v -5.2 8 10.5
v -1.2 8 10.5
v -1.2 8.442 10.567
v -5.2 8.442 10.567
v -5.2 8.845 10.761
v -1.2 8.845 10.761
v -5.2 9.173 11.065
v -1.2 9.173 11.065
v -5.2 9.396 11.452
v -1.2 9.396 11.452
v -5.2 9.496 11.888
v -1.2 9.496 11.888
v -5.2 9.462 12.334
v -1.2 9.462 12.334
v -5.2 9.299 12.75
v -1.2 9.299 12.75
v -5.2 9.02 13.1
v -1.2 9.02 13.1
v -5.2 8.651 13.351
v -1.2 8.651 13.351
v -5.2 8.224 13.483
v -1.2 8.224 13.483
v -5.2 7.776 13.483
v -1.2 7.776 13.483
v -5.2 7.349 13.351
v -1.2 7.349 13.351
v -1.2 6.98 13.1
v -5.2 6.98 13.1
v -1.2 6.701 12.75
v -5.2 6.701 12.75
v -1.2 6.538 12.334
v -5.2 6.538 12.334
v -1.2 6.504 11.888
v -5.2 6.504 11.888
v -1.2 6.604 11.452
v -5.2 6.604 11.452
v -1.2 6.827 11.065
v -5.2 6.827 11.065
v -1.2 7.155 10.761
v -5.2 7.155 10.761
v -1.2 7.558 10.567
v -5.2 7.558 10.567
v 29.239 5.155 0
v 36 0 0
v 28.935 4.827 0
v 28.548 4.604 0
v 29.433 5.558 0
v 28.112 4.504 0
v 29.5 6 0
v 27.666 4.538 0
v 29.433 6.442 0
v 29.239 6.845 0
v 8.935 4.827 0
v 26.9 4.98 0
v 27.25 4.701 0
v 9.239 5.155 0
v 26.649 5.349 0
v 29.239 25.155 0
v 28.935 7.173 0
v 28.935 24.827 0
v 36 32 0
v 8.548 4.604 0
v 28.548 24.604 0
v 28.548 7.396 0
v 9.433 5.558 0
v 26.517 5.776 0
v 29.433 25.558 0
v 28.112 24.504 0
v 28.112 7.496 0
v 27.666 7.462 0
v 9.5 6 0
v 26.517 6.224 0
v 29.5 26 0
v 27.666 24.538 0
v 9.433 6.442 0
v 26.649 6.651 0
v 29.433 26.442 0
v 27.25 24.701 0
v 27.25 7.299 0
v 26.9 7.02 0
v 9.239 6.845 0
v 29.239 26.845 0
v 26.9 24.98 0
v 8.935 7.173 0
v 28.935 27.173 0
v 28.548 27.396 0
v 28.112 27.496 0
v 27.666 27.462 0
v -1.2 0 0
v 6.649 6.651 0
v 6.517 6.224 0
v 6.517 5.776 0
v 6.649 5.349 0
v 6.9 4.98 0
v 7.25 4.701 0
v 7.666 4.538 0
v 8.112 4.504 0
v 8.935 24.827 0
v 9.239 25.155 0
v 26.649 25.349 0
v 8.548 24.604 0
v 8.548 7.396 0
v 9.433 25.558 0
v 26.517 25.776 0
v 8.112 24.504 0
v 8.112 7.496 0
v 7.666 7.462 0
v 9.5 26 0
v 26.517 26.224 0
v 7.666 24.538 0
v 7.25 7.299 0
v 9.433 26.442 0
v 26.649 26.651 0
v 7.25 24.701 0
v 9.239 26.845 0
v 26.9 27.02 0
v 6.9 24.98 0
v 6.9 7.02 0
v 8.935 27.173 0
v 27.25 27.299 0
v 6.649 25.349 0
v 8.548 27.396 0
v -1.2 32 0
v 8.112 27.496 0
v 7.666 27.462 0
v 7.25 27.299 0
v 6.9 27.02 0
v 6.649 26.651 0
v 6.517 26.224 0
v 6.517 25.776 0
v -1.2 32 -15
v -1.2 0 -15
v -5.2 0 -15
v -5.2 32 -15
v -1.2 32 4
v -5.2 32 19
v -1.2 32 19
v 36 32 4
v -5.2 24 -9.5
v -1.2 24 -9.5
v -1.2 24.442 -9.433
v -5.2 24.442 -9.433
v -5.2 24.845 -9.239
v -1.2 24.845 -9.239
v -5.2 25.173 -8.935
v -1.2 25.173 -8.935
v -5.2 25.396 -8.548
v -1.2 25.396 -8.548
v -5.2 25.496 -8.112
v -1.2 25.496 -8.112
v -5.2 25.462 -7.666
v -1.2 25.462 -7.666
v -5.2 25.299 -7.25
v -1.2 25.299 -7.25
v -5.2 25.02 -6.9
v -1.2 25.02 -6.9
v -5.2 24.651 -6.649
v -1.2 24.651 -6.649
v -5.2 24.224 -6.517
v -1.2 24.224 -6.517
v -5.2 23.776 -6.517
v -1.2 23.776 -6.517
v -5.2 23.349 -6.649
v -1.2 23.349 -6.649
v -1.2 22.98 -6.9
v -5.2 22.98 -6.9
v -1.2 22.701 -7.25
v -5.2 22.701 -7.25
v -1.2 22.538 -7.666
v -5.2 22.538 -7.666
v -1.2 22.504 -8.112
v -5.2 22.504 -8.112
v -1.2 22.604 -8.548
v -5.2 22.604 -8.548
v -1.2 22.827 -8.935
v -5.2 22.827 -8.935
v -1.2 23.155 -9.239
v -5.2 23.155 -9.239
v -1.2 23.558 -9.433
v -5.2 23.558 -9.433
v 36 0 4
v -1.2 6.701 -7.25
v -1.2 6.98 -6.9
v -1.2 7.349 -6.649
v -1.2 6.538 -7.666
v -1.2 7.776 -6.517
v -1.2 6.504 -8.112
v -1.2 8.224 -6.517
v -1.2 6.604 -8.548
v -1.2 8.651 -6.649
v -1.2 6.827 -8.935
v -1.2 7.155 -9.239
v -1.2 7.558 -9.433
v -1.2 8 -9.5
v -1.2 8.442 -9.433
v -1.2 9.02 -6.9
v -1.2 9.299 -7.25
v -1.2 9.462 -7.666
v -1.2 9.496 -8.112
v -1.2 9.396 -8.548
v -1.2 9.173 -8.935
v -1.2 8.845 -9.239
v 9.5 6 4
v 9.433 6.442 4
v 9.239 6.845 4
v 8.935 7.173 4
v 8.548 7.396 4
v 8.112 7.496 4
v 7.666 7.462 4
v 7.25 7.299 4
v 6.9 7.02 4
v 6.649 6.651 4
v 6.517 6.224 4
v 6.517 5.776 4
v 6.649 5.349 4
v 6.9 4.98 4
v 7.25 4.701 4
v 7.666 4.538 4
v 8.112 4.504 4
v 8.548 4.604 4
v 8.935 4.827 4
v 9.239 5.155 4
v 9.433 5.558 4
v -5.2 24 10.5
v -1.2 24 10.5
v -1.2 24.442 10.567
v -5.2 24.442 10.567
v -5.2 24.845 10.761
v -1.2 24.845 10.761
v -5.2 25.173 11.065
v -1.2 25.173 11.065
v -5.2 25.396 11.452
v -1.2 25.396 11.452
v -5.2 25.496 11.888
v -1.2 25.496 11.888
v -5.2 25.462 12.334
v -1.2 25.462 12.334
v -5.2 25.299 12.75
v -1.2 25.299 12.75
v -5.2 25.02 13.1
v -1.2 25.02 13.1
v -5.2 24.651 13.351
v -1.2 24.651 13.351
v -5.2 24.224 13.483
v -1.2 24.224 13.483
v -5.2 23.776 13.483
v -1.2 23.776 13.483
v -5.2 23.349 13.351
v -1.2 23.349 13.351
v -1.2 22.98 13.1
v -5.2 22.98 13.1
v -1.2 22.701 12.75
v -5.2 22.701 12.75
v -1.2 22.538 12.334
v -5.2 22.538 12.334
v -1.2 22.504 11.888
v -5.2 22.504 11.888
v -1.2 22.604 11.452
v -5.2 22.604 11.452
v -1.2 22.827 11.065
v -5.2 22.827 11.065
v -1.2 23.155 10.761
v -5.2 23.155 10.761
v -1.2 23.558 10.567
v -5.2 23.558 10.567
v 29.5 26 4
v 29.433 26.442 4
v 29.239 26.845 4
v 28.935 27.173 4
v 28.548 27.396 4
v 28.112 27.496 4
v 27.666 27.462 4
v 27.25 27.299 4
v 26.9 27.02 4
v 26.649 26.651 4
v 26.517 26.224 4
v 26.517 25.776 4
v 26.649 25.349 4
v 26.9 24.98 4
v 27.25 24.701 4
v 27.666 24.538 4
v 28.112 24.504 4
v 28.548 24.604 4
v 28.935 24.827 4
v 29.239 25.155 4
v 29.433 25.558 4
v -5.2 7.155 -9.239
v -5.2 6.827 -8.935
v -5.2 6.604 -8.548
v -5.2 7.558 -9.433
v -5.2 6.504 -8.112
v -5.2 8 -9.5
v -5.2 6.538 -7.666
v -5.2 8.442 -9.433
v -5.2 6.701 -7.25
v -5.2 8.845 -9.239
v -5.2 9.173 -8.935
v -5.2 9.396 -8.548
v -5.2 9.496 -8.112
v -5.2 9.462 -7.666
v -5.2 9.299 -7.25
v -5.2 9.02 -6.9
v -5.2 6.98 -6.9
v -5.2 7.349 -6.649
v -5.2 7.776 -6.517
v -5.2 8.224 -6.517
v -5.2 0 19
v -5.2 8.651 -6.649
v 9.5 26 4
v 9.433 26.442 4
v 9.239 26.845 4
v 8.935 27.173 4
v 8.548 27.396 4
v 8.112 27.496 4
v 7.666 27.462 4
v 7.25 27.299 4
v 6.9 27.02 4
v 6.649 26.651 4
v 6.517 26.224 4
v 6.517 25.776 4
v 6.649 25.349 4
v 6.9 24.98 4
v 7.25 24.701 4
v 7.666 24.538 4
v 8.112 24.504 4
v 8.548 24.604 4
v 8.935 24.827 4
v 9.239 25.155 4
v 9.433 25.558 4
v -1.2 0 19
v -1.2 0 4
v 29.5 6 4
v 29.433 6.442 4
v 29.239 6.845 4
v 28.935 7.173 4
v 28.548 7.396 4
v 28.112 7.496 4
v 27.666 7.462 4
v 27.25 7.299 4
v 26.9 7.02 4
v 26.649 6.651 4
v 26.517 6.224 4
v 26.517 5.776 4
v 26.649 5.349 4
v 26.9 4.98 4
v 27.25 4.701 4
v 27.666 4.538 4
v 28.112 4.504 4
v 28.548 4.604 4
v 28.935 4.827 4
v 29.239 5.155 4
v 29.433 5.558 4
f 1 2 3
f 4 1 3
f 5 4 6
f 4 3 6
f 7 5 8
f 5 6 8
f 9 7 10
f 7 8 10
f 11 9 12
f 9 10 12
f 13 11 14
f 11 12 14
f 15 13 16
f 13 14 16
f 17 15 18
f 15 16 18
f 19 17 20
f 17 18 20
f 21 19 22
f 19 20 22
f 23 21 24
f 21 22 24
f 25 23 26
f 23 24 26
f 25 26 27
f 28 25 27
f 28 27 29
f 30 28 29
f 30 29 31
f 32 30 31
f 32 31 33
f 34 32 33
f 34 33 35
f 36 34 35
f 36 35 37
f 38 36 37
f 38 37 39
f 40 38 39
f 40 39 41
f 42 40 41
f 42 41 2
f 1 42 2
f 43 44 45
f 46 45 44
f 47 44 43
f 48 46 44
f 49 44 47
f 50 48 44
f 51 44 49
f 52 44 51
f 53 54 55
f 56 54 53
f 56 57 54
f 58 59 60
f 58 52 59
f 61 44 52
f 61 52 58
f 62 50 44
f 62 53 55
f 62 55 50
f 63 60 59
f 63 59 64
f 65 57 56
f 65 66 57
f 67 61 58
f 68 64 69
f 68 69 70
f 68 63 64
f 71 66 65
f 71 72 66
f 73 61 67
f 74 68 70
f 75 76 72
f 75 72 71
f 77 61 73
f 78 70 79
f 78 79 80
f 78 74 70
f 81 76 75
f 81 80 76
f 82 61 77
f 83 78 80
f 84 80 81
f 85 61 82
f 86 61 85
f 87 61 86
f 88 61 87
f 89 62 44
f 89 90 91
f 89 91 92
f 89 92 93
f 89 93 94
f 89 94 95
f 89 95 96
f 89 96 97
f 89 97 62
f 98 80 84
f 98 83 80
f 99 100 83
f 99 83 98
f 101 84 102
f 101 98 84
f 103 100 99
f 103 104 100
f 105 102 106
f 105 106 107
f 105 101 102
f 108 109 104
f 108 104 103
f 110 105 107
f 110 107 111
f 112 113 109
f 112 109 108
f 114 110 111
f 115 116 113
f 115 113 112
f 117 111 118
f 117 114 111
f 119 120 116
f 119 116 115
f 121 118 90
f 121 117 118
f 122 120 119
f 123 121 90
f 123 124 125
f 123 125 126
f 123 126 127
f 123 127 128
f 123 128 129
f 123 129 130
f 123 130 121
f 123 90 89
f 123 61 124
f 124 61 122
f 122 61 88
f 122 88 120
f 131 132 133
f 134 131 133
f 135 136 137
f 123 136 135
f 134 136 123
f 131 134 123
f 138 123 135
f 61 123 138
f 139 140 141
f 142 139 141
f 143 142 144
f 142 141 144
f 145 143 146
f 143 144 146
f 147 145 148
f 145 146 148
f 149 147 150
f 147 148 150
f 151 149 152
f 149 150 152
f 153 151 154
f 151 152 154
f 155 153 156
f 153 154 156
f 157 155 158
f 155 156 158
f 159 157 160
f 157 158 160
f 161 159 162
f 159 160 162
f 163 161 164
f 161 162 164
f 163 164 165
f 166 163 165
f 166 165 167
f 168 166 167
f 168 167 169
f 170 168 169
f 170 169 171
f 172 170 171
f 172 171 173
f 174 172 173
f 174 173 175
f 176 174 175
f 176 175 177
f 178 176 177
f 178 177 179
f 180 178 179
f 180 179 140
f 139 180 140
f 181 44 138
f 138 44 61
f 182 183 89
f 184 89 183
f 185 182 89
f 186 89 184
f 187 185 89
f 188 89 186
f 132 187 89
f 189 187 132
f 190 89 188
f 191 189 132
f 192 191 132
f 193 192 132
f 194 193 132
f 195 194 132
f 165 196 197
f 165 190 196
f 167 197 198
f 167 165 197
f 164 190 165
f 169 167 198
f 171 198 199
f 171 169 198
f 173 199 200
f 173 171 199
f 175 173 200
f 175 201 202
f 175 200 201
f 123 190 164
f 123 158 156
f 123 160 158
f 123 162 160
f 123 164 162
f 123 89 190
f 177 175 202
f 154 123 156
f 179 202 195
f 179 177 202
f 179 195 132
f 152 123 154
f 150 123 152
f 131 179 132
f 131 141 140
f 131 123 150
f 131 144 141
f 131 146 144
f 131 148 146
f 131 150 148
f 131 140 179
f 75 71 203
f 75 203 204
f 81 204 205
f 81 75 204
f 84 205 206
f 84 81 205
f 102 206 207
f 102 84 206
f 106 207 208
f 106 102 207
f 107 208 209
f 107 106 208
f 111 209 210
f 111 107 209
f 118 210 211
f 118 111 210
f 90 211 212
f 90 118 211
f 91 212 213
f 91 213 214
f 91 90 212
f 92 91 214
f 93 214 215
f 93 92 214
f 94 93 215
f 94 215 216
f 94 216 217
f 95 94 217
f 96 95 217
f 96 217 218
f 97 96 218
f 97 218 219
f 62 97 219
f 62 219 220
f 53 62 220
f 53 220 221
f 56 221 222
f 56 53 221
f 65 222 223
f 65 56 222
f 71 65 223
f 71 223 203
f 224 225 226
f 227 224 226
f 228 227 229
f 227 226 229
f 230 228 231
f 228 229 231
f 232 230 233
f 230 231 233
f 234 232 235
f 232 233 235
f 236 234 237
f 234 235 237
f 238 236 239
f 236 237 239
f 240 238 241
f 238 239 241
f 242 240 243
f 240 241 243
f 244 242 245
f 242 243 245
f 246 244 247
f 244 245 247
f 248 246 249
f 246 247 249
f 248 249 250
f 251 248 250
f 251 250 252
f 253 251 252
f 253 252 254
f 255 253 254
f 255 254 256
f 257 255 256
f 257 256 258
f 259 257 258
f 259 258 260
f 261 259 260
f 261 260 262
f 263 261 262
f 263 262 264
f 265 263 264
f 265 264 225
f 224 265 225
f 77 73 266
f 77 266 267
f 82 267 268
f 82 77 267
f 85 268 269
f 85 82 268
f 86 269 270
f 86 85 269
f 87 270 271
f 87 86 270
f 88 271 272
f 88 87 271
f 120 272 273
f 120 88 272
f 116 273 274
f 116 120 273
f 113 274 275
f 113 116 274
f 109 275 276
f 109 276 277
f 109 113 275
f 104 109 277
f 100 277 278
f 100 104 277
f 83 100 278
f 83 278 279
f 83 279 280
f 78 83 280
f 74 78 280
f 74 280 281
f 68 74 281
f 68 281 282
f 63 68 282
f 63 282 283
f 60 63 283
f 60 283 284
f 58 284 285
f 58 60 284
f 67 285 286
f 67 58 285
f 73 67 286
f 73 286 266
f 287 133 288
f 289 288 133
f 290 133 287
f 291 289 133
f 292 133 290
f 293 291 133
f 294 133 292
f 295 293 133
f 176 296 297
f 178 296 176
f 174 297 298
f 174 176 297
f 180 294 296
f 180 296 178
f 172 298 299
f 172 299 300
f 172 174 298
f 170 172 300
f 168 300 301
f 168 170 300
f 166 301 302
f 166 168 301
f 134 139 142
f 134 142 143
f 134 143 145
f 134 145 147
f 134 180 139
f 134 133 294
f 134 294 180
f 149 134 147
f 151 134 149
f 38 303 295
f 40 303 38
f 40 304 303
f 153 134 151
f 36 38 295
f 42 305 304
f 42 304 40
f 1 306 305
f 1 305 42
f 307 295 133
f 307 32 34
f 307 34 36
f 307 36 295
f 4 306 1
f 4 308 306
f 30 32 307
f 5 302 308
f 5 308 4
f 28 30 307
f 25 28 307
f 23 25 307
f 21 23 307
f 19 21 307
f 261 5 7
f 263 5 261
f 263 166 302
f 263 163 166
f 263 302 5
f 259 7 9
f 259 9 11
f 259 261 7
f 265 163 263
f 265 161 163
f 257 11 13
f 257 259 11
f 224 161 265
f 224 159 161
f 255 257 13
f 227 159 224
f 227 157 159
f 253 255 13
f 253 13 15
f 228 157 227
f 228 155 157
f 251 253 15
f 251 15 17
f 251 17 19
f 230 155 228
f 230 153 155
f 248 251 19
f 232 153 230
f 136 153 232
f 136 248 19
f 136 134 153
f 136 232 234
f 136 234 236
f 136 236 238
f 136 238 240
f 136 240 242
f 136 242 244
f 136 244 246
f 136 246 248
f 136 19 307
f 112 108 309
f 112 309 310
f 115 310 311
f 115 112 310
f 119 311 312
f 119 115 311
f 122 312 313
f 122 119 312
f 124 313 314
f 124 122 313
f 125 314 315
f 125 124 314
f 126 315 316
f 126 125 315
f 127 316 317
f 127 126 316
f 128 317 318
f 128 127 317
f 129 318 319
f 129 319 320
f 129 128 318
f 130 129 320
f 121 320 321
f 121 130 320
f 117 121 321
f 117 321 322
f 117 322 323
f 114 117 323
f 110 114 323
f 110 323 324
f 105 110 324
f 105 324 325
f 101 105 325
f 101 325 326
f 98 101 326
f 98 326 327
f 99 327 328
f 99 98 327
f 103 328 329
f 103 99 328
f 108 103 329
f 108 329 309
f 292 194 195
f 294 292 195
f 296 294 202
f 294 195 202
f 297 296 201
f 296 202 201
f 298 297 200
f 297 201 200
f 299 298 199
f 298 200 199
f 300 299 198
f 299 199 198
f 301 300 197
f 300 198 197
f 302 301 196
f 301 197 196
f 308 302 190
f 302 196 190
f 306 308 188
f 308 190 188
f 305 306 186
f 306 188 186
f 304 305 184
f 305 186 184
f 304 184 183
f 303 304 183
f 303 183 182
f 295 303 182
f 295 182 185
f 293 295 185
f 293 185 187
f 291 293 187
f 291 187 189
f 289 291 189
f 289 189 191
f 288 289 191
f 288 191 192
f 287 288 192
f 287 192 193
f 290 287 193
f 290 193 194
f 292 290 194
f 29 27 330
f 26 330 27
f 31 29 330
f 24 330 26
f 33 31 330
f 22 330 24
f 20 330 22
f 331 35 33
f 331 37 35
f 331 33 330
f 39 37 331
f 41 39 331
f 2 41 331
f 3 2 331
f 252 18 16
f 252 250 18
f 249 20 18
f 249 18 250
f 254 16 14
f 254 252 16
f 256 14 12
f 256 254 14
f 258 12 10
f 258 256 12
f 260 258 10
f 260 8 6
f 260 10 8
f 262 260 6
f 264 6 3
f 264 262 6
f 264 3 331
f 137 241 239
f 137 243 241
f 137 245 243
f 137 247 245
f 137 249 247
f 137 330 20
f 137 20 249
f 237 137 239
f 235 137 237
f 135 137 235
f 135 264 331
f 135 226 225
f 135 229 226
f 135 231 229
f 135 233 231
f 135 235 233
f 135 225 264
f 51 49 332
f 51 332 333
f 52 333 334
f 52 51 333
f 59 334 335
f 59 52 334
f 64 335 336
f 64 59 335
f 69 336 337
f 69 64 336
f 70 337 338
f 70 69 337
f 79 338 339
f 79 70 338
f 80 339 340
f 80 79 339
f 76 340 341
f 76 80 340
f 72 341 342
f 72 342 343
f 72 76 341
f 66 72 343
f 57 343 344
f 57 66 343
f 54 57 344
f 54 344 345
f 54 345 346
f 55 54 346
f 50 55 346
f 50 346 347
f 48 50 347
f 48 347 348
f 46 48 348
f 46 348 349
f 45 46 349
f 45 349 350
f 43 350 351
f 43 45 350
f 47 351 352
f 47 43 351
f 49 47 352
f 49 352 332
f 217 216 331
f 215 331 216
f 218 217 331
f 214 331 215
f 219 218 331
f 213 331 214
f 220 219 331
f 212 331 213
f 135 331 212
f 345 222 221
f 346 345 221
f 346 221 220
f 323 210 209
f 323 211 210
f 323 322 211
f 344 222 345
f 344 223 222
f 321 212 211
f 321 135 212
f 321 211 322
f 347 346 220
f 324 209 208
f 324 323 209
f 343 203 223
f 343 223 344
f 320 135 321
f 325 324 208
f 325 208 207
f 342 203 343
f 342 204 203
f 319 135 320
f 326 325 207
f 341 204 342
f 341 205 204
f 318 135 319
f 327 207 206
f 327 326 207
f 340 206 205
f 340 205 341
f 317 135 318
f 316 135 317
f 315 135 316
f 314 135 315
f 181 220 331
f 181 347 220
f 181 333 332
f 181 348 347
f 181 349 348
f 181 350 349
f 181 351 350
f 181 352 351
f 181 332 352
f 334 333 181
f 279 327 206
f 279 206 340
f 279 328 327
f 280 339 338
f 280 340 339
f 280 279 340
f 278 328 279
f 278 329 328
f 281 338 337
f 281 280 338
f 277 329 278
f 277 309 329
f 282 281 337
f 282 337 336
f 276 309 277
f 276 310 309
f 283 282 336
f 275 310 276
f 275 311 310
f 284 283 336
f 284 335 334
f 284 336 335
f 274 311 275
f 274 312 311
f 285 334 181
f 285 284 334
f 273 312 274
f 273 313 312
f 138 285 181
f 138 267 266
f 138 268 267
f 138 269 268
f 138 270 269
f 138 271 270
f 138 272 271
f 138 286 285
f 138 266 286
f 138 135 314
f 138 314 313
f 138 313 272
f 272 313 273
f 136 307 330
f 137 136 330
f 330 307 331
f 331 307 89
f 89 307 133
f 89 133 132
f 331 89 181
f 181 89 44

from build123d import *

# Parameters (mm, degrees)
SKETCH_1_W          = 36
SKETCH_1_H          = 32
SKETCH_1_R          = 1.5
EXTRUDE_1_DEPTH     = 4
EXTRUDE_2_DEPTH     = 32
SKETCH_8_R          = 1.5
CUT_EXTRUDE_1_DEPTH = 5


with BuildPart() as part:
    # Эскиз1 → Бобышка-Вытянуть1 (new body)
    with BuildSketch(Plane.XY):
        with Locations((18, 16)):
            Rectangle(SKETCH_1_W, SKETCH_1_H)
        with Locations((8, 26)):
            Circle(SKETCH_1_R, mode=Mode.SUBTRACT)
        with Locations((28, 26)):
            Circle(SKETCH_1_R, mode=Mode.SUBTRACT)
        with Locations((8, 6)):
            Circle(SKETCH_1_R, mode=Mode.SUBTRACT)
        with Locations((28, 6)):
            Circle(SKETCH_1_R, mode=Mode.SUBTRACT)
    extrude(amount=EXTRUDE_1_DEPTH)

    # Эскиз7 → Бобышка-Вытянуть2 (add)
    with BuildSketch(Plane(origin=(0, 32, 0), x_dir=(1, 0, 0), z_dir=(0, 1, 0))):
        Polygon((0, 0), (-1.2, 0), (-1.2, 15), (-5.2, 15), (-5.2, -19), (-1.2, -19), (-1.2, -4), (0, -4), align=None)
    extrude(amount=-EXTRUDE_2_DEPTH)

    # Эскиз8 → Вырез-Вытянуть1 (cut, through all)
    with BuildSketch(Plane(origin=(-1.2, 0, 0), x_dir=(0, 0, -1), z_dir=(1, 0, 0))):
        with Locations((8, 24)):
            Circle(SKETCH_8_R)
        with Locations((8, 8)):
            Circle(SKETCH_8_R)
        with Locations((-12, 8)):
            Circle(SKETCH_8_R)
        with Locations((-12, 24)):
            Circle(SKETCH_8_R)
    extrude(amount=-CUT_EXTRUDE_1_DEPTH, mode=Mode.SUBTRACT)


solid = part.part
